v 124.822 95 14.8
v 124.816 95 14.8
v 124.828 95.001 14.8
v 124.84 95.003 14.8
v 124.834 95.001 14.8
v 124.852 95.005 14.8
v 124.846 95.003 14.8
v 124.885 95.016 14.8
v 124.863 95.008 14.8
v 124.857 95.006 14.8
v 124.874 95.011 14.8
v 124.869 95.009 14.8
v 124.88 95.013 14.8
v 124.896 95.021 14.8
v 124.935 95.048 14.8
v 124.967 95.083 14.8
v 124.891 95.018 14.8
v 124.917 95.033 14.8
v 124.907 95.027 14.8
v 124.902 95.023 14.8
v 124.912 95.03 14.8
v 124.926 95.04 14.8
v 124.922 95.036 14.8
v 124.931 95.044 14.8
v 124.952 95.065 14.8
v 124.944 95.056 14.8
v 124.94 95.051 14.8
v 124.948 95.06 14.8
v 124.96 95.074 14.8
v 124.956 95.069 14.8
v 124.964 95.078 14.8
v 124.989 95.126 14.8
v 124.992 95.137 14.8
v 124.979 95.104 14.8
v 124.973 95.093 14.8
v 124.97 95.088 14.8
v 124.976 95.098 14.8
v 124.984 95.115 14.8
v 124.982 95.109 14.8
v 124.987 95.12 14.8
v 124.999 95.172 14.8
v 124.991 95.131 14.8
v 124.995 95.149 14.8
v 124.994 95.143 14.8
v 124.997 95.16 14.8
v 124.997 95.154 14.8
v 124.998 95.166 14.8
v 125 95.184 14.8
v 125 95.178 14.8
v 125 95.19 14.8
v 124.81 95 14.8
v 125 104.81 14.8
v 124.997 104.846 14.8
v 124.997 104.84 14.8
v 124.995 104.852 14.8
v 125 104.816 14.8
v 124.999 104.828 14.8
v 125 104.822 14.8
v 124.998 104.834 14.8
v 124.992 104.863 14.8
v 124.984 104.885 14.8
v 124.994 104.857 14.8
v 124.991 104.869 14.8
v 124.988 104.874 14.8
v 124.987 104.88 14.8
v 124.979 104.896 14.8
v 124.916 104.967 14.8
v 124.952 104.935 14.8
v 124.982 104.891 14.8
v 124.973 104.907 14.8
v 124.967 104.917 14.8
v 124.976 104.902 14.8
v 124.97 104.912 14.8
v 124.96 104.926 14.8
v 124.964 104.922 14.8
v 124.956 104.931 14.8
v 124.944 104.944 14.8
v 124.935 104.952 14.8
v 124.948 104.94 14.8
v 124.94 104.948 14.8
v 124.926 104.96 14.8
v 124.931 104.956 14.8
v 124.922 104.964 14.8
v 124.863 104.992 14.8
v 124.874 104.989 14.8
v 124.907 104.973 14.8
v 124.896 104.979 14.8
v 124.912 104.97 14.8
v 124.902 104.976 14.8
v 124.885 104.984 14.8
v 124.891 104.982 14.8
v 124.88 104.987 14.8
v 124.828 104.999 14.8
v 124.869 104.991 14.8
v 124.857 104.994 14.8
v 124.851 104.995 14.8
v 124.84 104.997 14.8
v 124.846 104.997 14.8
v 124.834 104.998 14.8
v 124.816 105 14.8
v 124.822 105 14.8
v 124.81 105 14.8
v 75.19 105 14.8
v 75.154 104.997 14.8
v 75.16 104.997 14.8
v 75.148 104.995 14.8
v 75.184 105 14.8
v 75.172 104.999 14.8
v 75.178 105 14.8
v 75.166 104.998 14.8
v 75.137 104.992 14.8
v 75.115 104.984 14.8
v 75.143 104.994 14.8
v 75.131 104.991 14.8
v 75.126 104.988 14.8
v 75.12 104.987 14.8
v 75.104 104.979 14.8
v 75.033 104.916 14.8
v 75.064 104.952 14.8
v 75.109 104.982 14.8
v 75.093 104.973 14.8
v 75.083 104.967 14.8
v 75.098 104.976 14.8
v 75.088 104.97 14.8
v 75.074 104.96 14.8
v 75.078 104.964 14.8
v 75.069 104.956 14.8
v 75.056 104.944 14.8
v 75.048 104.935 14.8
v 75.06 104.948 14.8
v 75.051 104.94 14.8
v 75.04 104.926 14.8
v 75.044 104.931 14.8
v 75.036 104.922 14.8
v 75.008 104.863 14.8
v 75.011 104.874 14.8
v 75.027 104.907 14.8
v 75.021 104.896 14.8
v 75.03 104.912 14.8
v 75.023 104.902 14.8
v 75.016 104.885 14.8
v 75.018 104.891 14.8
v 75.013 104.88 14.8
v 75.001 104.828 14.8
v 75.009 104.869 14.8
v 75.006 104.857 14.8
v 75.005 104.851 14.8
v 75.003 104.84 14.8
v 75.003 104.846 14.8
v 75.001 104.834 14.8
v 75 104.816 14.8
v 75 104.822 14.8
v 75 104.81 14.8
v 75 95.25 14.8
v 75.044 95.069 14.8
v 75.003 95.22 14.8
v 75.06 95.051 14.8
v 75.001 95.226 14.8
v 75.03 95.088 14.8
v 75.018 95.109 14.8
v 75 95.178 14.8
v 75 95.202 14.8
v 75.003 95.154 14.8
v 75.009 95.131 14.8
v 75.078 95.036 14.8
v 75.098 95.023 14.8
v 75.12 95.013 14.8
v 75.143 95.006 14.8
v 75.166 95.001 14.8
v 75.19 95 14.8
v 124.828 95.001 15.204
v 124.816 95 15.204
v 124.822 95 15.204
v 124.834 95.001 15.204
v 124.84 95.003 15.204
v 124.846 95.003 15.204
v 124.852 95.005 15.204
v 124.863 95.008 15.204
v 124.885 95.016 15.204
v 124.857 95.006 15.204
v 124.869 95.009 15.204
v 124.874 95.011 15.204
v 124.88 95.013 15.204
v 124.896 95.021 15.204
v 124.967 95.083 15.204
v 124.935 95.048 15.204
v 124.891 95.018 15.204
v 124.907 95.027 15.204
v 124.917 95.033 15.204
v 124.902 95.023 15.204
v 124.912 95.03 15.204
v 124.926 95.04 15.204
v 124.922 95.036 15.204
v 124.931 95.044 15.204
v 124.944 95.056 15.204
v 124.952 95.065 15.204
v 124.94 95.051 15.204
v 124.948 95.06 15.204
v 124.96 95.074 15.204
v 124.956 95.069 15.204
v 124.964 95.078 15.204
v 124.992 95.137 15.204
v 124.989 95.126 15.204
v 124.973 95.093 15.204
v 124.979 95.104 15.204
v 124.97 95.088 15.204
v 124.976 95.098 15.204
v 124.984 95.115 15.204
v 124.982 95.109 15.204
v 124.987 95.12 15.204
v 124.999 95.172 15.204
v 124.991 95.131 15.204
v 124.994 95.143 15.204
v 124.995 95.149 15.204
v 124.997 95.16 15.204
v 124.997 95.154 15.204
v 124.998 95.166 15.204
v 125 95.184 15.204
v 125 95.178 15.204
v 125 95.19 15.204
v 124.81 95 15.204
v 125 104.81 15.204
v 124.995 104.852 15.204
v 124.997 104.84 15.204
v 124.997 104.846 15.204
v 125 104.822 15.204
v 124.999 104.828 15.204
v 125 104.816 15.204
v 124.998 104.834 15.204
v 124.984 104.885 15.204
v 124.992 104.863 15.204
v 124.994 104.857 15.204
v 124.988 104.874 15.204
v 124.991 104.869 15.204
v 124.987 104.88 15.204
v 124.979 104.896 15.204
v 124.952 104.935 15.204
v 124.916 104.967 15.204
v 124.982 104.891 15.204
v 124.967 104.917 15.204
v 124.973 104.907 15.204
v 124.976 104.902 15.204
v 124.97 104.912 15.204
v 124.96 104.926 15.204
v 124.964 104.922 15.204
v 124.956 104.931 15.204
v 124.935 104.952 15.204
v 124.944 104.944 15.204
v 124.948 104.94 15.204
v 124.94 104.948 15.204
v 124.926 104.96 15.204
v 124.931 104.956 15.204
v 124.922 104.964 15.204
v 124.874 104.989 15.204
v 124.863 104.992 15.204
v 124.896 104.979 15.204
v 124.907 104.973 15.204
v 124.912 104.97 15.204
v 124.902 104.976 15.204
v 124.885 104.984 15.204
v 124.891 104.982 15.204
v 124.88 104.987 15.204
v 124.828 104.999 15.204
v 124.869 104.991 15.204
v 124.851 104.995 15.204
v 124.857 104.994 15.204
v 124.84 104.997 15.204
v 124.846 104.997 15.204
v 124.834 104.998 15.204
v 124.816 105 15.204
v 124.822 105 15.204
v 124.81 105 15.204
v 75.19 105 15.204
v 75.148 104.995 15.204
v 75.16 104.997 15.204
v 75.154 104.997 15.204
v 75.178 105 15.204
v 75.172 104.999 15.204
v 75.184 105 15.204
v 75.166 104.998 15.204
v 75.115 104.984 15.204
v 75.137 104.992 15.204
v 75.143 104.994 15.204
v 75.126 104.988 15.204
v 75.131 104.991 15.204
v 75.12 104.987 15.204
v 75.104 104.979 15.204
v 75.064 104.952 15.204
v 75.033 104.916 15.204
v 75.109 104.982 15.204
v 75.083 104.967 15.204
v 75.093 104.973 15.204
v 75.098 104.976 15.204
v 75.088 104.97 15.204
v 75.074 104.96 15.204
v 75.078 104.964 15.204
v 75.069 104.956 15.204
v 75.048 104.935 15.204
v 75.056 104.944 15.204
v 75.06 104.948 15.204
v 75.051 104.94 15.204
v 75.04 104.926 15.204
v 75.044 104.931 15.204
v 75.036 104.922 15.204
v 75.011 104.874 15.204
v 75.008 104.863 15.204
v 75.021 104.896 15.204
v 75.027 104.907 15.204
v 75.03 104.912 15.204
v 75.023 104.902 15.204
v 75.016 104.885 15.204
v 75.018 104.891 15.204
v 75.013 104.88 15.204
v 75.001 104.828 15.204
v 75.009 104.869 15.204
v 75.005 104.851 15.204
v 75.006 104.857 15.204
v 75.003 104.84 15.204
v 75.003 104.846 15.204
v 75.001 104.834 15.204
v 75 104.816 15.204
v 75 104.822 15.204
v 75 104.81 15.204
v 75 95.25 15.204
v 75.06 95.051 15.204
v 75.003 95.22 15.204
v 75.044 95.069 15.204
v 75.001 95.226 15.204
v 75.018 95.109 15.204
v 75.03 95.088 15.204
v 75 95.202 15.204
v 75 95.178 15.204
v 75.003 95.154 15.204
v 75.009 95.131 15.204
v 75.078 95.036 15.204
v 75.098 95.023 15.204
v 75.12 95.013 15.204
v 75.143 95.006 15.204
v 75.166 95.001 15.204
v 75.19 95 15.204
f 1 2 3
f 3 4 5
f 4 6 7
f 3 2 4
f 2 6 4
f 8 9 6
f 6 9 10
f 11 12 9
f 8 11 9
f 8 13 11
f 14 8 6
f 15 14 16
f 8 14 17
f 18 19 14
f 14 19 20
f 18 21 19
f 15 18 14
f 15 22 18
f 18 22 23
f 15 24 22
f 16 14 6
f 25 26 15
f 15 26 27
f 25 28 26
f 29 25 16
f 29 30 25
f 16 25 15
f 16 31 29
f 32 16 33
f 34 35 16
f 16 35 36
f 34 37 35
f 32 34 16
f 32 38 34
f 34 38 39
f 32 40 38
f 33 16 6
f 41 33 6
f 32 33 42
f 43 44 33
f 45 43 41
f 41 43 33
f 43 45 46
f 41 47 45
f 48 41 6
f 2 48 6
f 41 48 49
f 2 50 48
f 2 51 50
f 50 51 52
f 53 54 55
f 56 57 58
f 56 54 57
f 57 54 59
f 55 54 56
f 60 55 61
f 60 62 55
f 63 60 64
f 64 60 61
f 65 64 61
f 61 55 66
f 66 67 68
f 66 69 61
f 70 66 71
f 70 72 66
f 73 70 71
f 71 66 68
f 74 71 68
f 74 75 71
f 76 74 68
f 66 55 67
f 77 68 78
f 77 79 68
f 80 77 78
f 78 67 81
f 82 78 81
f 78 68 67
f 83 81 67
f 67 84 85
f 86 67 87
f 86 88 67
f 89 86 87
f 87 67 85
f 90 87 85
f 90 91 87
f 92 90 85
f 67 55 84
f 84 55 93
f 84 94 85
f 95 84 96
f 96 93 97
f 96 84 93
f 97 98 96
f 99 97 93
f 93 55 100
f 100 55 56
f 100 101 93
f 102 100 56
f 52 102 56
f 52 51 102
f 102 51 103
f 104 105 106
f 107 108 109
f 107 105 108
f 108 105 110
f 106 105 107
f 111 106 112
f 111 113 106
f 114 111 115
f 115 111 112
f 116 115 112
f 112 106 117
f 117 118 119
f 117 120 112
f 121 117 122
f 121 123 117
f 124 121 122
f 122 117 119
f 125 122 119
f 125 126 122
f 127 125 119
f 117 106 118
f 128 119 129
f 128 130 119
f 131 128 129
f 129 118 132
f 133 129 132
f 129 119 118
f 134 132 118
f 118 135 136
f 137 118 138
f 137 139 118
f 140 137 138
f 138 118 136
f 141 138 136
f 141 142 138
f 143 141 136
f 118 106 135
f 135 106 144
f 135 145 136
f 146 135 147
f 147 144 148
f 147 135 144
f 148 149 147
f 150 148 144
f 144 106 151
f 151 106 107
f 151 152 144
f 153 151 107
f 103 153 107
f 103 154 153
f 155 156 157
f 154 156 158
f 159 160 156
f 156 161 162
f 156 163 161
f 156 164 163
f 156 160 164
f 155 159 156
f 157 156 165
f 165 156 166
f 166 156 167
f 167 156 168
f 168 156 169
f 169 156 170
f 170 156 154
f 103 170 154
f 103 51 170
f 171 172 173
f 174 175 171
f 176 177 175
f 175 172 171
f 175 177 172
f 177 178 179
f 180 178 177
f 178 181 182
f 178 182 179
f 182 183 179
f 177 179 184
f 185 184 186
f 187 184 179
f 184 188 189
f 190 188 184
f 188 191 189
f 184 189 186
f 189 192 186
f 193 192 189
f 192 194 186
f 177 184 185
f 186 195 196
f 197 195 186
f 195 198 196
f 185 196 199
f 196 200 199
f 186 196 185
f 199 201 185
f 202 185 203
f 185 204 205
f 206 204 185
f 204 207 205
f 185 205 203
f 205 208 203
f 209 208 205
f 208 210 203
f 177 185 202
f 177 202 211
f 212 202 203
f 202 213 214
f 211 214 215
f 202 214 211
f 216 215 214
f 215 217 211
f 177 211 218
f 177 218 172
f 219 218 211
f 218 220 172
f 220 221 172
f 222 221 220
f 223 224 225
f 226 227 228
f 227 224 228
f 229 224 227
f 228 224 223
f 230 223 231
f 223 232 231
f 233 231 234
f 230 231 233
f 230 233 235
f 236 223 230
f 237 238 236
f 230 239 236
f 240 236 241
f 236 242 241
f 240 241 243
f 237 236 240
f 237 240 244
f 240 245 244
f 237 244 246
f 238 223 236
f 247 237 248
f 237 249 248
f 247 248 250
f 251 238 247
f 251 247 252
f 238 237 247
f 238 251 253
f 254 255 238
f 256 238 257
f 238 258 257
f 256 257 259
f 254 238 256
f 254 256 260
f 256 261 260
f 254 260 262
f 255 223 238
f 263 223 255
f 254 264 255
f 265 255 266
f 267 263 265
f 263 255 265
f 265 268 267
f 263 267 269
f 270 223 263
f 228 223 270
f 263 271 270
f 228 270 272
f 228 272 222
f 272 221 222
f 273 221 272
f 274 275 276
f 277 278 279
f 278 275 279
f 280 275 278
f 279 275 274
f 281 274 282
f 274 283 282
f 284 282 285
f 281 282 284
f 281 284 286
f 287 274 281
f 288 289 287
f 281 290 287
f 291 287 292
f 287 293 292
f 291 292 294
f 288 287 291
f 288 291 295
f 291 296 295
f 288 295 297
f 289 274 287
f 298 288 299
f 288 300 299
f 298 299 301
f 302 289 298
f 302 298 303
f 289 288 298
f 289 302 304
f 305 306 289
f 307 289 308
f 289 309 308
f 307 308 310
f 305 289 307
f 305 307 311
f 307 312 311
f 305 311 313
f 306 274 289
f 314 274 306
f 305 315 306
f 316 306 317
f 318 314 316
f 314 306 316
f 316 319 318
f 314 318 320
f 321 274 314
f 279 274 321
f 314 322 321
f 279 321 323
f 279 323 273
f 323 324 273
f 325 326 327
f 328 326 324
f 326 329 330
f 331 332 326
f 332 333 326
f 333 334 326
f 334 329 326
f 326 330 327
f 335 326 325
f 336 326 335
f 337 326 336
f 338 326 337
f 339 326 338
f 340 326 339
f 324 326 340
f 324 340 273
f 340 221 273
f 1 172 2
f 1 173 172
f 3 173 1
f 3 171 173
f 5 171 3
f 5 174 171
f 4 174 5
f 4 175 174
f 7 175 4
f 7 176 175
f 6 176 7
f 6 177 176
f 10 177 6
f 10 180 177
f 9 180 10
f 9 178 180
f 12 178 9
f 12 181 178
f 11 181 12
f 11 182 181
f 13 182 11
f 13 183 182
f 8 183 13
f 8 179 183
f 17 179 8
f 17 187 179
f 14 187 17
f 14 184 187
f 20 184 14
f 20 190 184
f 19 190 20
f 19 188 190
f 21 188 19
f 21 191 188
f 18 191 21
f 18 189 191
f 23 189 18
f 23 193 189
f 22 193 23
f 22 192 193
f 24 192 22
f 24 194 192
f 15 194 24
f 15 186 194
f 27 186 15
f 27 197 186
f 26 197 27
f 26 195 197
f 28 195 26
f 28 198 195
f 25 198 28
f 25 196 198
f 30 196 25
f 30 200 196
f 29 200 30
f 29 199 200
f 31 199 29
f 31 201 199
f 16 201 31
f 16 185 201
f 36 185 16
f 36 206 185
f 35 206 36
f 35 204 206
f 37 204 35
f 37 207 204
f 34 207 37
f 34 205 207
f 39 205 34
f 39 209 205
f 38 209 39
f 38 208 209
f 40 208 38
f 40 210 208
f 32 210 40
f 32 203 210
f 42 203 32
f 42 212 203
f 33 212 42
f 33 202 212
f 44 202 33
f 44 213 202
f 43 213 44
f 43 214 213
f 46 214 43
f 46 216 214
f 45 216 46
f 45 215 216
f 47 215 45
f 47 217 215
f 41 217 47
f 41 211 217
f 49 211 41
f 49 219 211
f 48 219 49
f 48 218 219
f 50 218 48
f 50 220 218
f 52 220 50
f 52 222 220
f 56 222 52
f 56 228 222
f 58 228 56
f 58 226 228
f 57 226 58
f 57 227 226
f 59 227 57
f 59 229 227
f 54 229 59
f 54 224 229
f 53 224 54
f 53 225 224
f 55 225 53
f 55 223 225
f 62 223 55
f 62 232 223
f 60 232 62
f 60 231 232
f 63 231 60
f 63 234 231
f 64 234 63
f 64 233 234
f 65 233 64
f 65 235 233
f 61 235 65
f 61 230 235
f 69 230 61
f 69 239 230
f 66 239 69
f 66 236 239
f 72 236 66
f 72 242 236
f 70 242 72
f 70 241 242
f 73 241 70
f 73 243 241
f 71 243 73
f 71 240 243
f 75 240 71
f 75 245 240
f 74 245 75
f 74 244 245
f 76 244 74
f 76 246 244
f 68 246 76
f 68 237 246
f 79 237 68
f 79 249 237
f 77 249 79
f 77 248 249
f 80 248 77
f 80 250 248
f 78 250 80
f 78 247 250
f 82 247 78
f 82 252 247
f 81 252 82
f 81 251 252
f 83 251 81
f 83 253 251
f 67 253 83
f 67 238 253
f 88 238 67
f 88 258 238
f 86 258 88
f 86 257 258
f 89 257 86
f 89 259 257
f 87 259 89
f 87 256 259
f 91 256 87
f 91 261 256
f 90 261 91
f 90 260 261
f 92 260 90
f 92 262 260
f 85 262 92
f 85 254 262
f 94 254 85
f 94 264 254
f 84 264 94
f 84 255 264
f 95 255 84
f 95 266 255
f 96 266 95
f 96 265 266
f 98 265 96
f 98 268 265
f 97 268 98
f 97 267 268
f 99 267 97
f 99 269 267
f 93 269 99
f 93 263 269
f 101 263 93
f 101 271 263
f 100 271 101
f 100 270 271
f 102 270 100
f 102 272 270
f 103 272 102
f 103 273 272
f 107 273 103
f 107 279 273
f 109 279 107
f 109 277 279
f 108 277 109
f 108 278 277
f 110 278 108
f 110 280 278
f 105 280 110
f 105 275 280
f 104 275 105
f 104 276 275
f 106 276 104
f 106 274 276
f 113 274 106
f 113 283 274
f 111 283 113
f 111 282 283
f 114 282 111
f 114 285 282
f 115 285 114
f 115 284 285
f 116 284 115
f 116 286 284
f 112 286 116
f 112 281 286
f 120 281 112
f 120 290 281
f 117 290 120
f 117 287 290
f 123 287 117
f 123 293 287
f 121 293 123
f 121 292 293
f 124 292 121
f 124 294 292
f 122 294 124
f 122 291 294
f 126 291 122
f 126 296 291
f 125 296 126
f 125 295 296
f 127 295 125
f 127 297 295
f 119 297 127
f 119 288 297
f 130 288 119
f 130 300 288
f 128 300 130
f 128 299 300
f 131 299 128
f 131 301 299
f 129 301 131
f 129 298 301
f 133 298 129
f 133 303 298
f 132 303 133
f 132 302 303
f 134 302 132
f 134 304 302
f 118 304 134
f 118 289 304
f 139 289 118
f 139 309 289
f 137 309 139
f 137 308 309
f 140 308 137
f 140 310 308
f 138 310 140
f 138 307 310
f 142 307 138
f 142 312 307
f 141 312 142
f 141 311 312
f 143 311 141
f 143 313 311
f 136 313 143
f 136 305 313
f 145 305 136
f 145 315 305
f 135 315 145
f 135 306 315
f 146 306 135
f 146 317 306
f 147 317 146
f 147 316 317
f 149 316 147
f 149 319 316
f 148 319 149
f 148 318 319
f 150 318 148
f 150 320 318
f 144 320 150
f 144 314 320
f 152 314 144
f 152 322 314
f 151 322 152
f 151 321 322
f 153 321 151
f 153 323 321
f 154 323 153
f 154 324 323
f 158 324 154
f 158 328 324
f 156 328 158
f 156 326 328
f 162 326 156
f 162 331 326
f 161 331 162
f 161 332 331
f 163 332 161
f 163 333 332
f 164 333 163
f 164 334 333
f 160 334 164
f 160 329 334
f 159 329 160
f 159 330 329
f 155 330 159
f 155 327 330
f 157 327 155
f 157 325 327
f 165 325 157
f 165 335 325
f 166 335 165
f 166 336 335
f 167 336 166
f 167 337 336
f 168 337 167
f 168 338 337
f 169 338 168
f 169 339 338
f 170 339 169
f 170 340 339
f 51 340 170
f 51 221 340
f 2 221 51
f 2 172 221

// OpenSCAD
module drawBasicShape(x1, y1, x2, y2, width)
{
	length = sqrt((x1-x2)*(x1-x2) + (y1-y2)*(y1-y2));
	if (width!=0.0) {
		square(size = [width, length], center = false);
		translate([width/2.0, 0, 0]) circle(d=width);
		translate([width/2.0, length, 0]) circle(d=width);
	}
}

module translateAndRotate(x1, y1, x2, y2, width)
{
	if (width != 0.0) {
		angle = atan((y2-y1)/(x2-x1)) +270;
		if (x2>=x1) {
			translate([x1, y1, 0.0]) rotate([0.0, 0.0, angle]) translate([-width/2.0, 0.0, 0.0]) scale([1.0, 1.0, 1.0]) drawBasicShape(x1, y1, x2, y2, width);
		}
		else {
			translate([x1, y1, 0.0]) rotate([0.0, 0.0, angle+180]) translate([-width/2.0, 0.0, 0.0]) scale([1.0, 1.0, 1.0]) drawBasicShape(x1, y1, x2, y2, width);		}
	}
}

$fn=50;

points36 = [
[75.77800000, 95.77800000, 0.00000000],
[124.22200000, 95.77800000, 0.37999548],
[124.22200000, 104.22200000, 0.37997788],
[75.77800000, 104.22200000, 0.37999672],
[75.77800000, 95.83800000, 0.37997423],
[75.48400000, 95.48400000, 0.00000000],
[124.51600000, 95.48400000, 0.37999868],
[124.51600000, 104.51600000, 0.37998977],
[75.48400000, 104.51600000, 0.37999746],
[75.48400000, 95.54400000, 0.37999314],
[75.19000000, 95.19000000, 0.00000000],
[124.81000000, 95.19000000, 0.37999939],
[124.81000000, 104.81000000, 0.38000021],
[75.19000000, 104.81000000, 0.38000060],
[75.19000000, 95.25000000, 0.37999715],
[75.53600000, 95.39000000, 0.00000000],
[75.94600000, 103.88900000, 0.00000000],
[76.11100000, 104.05400000, 0.38038683],
[76.52800000, 104.05400000, 0.38073291],
[75.94600000, 103.47200000, 0.38070298],
[75.94600000, 103.05500000, 0.38073291],
[76.94500000, 104.05400000, 0.38071263],
[77.36200000, 104.05400000, 0.38073291],
[75.94600000, 102.63800000, 0.38074663],
[75.94600000, 102.22100000, 0.38087711],
[77.77900000, 104.05400000, 0.38074196],
[78.19600000, 104.05400000, 0.38073291],
[75.94600000, 101.80400000, 0.38077681],
[75.94600000, 101.38700000, 0.38073291],
[78.61300000, 104.05400000, 0.38076888],
[79.03000000, 104.05400000, 0.38073291],
[75.94600000, 100.97000000, 0.38077689],
[75.94600000, 100.55300000, 0.38073291],
[79.44700000, 104.05400000, 0.38077084],
[79.86400000, 104.05400000, 0.38087711],
[75.94600000, 100.13600000, 0.38077693],
[75.94600000, 99.71900000, 0.38073291],
[80.28100000, 104.05400000, 0.38078185],
[80.69800000, 104.05400000, 0.38073291],
[75.94600000, 99.30200000, 0.38077696],
[75.94600000, 98.88500000, 0.38087711],
[81.11500000, 104.05400000, 0.38078108],
[81.53300000, 104.05400000, 0.38002742],
[75.94600000, 98.46700000, 0.38073180],
[75.94600000, 98.05000000, 0.38073291],
[81.95000000, 104.05400000, 0.38073848],
[82.36700000, 104.05400000, 0.38073291],
[75.94600000, 97.63300000, 0.38073768],
[75.94600000, 97.21600000, 0.38087711],
[82.78400000, 104.05400000, 0.38073697],
[83.20100000, 104.05400000, 0.38087711],
[75.94600000, 96.79900000, 0.38074221],
[75.94600000, 96.38200000, 0.38087711],
[83.61800000, 104.05400000, 0.38074688],
[84.03500000, 104.05400000, 0.38073291],
[75.95600000, 95.97600000, 0.38075015],
[76.34400000, 95.94600000, 0.38035263],
[84.45200000, 104.05400000, 0.38075745],
[84.86900000, 104.05400000, 0.38073291],
[76.76100000, 95.94600000, 0.38075745],
[77.17800000, 95.94600000, 0.38073291],
[85.28600000, 104.05400000, 0.38075745],
[85.70300000, 104.05400000, 0.38073291],
[77.59500000, 95.94600000, 0.38075745],
[78.01200000, 95.94600000, 0.38073291],
[86.12000000, 104.05400000, 0.38075745],
[86.53700000, 104.05400000, 0.38073291],
[78.42900000, 95.94600000, 0.38075745],
[78.84600000, 95.94600000, 0.38073291],
[86.95400000, 104.05400000, 0.38075745],
[87.37100000, 104.05400000, 0.38073291],
[79.26300000, 95.94600000, 0.38075745],
[79.68000000, 95.94600000, 0.38073291],
[87.78900000, 104.05400000, 0.38073927],
[88.20600000, 104.05400000, 0.38073291],
[80.09700000, 95.94600000, 0.38073927],
[80.51400000, 95.94600000, 0.38073291],
[88.62300000, 104.05400000, 0.38073927],
[89.04000000, 104.05400000, 0.38073291],
[80.93200000, 95.94600000, 0.38075745],
[81.34900000, 95.94600000, 0.38073291],
[89.45700000, 104.05400000, 0.38075745],
[89.87400000, 104.05400000, 0.38073291],
[81.76600000, 95.94600000, 0.38075745],
[82.18300000, 95.94600000, 0.38073291],
[90.29100000, 104.05400000, 0.38075745],
[90.70800000, 104.05400000, 0.38073291],
[82.60000000, 95.94600000, 0.38075745],
[83.01700000, 95.94600000, 0.38073291],
[91.12500000, 104.05400000, 0.38075745],
[91.54200000, 104.05400000, 0.38073291],
[83.43400000, 95.94600000, 0.38075745],
[83.85100000, 95.94600000, 0.38073291],
[91.95900000, 104.05400000, 0.38075745],
[92.37600000, 104.05400000, 0.38073291],
[84.26800000, 95.94600000, 0.38075745],
[84.68500000, 95.94600000, 0.38073291],
[92.79300000, 104.05400000, 0.38075745],
[93.21000000, 104.05400000, 0.38087711],
[85.10200000, 95.94600000, 0.38075221],
[85.51900000, 95.94600000, 0.38087711],
[93.62700000, 104.05400000, 0.38075221],
[94.04400000, 104.05400000, 0.38087711],
[85.93600000, 95.94600000, 0.38075221],
[86.35300000, 95.94600000, 0.38087711],
[94.46200000, 104.05400000, 0.38073402],
[94.87900000, 104.05400000, 0.38087711],
[86.77000000, 95.94600000, 0.38073402],
[87.18800000, 95.94600000, 0.38017128],
[95.29600000, 104.05400000, 0.38075221],
[95.71300000, 104.05400000, 0.38087711],
[87.60500000, 95.94600000, 0.38075221],
[88.02200000, 95.94600000, 0.38087711],
[96.13000000, 104.05400000, 0.38075221],
[96.54700000, 104.05400000, 0.38087711],
[88.43900000, 95.94600000, 0.38075221],
[88.85600000, 95.94600000, 0.38087711],
[96.96400000, 104.05400000, 0.38075221],
[97.38100000, 104.05400000, 0.38087711],
[89.27300000, 95.94600000, 0.38075221],
[89.69000000, 95.94600000, 0.38087711],
[97.79800000, 104.05400000, 0.38075221],
[98.21500000, 104.05400000, 0.38087711],
[90.10700000, 95.94600000, 0.38075221],
[90.52400000, 95.94600000, 0.38087711],
[98.63200000, 104.05400000, 0.38075221],
[99.04900000, 104.05400000, 0.38087711],
[90.94100000, 95.94600000, 0.38075221],
[91.35800000, 95.94600000, 0.38087711],
[99.46600000, 104.05400000, 0.38075221],
[99.88300000, 104.05400000, 0.38087711],
[91.77500000, 95.94600000, 0.38075221],
[92.19200000, 95.94600000, 0.38087711],
[100.30000000, 104.05400000, 0.38075221],
[100.71800000, 104.05400000, 0.38017128],
[92.60900000, 95.94600000, 0.38073402],
[93.02600000, 95.94600000, 0.38087711],
[101.13500000, 104.05400000, 0.38073402],
[101.55200000, 104.05400000, 0.38087711],
[93.44400000, 95.94600000, 0.38075221],
[93.86100000, 95.94600000, 0.38087711],
[101.96900000, 104.05400000, 0.38075221],
[102.38600000, 104.05400000, 0.38087711],
[94.27800000, 95.94600000, 0.38075221],
[94.69500000, 95.94600000, 0.38087711],
[102.80300000, 104.05400000, 0.38075221],
[103.22000000, 104.05400000, 0.38087711],
[95.11200000, 95.94600000, 0.38075221],
[95.52900000, 95.94600000, 0.38087711],
[103.63700000, 104.05400000, 0.38075221],
[104.05400000, 104.05400000, 0.38087711],
[95.94600000, 95.94600000, 0.38075221],
[96.36300000, 95.94600000, 0.38087711],
[104.47100000, 104.05400000, 0.38075221],
[104.88800000, 104.05400000, 0.38087711],
[96.78000000, 95.94600000, 0.38075221],
[97.19700000, 95.94600000, 0.38087711],
[105.30500000, 104.05400000, 0.38075221],
[105.72200000, 104.05400000, 0.38087711],
[97.61400000, 95.94600000, 0.38075221],
[98.03100000, 95.94600000, 0.38087711],
[106.13900000, 104.05400000, 0.38075221],
[106.55600000, 104.05400000, 0.38087711],
[98.44800000, 95.94600000, 0.38075221],
[98.86500000, 95.94600000, 0.38087711],
[106.97300000, 104.05400000, 0.38075221],
[107.39100000, 104.05400000, 0.38017128],
[99.28200000, 95.94600000, 0.38073402],
[99.69900000, 95.94600000, 0.38087711],
[107.80800000, 104.05400000, 0.38073402],
[108.22500000, 104.05400000, 0.38087711],
[100.11700000, 95.94600000, 0.38075221],
[100.53400000, 95.94600000, 0.38087711],
[108.64200000, 104.05400000, 0.38075221],
[109.05900000, 104.05400000, 0.38087711],
[100.95100000, 95.94600000, 0.38075221],
[101.36800000, 95.94600000, 0.38087711],
[109.47600000, 104.05400000, 0.38075221],
[109.89300000, 104.05400000, 0.38087711],
[101.78500000, 95.94600000, 0.38075221],
[102.20200000, 95.94600000, 0.38087711],
[110.31000000, 104.05400000, 0.38075221],
[110.72700000, 104.05400000, 0.38087711],
[102.61900000, 95.94600000, 0.38075221],
[103.03600000, 95.94600000, 0.38087711],
[111.14400000, 104.05400000, 0.38075221],
[111.56100000, 104.05400000, 0.38087711],
[103.45300000, 95.94600000, 0.38075221],
[103.87000000, 95.94600000, 0.38087711],
[111.97800000, 104.05400000, 0.38075221],
[112.39500000, 104.05400000, 0.38087711],
[104.28700000, 95.94600000, 0.38075221],
[104.70400000, 95.94600000, 0.38087711],
[112.81200000, 104.05400000, 0.38075221],
[113.22900000, 104.05400000, 0.38087711],
[105.12100000, 95.94600000, 0.38075221],
[105.53800000, 95.94600000, 0.38087711],
[113.64700000, 104.05400000, 0.38073402],
[114.06400000, 104.05400000, 0.38087711],
[105.95500000, 95.94600000, 0.38073402],
[106.37300000, 95.94600000, 0.38017128],
[114.48100000, 104.05400000, 0.38075221],
[114.89800000, 104.05400000, 0.38087711],
[106.79000000, 95.94600000, 0.38075745],
[107.20700000, 95.94600000, 0.38073291],
[115.31500000, 104.05400000, 0.38075745],
[115.73200000, 104.05400000, 0.38073291],
[107.62400000, 95.94600000, 0.38075745],
[108.04100000, 95.94600000, 0.38073291],
[116.14900000, 104.05400000, 0.38075745],
[116.56600000, 104.05400000, 0.38073291],
[108.45800000, 95.94600000, 0.38075745],
[108.87500000, 95.94600000, 0.38073291],
[116.98300000, 104.05400000, 0.38075745],
[117.40000000, 104.05400000, 0.38073291],
[109.29200000, 95.94600000, 0.38075745],
[109.70900000, 95.94600000, 0.38073291],
[117.81700000, 104.05400000, 0.38075745],
[118.23400000, 104.05400000, 0.38073291],
[110.12600000, 95.94600000, 0.38075745],
[110.54300000, 95.94600000, 0.38073291],
[118.65100000, 104.05400000, 0.38075745],
[119.06800000, 104.05400000, 0.38073291],
[110.96000000, 95.94600000, 0.38075745],
[111.37700000, 95.94600000, 0.38073291],
[119.48500000, 104.05400000, 0.38075745],
[119.90300000, 104.05400000, 0.38002742],
[111.79400000, 95.94600000, 0.38073927],
[112.21100000, 95.94600000, 0.38073291],
[120.32000000, 104.05400000, 0.38073927],
[120.73700000, 104.05400000, 0.38073291],
[112.62900000, 95.94600000, 0.38075745],
[113.04600000, 95.94600000, 0.38073291],
[121.15400000, 104.05400000, 0.38075745],
[121.57100000, 104.05400000, 0.38073291],
[113.46300000, 95.94600000, 0.38075745],
[113.88000000, 95.94600000, 0.38073291],
[121.98800000, 104.05400000, 0.38075745],
[122.40500000, 104.05400000, 0.38073291],
[114.29700000, 95.94600000, 0.38075745],
[114.71400000, 95.94600000, 0.38073291],
[122.82200000, 104.05400000, 0.38075745],
[123.23900000, 104.05400000, 0.38073291],
[115.13100000, 95.94600000, 0.38075745],
[115.54800000, 95.94600000, 0.38073291],
[123.65600000, 104.05400000, 0.38075745],
[124.04400000, 104.02500000, 0.38041002],
[115.96500000, 95.94600000, 0.38073190],
[116.38200000, 95.94600000, 0.38087711],
[124.05400000, 103.61800000, 0.38074688],
[124.05400000, 103.20100000, 0.38087711],
[116.79900000, 95.94600000, 0.38074221],
[117.21600000, 95.94600000, 0.38087711],
[124.05400000, 102.78400000, 0.38074319],
[124.05400000, 102.36700000, 0.38073291],
[117.63300000, 95.94600000, 0.38074430],
[118.05000000, 95.94600000, 0.38073291],
[124.05400000, 101.95000000, 0.38073848],
[124.05400000, 101.53300000, 0.38073291],
[118.46700000, 95.94600000, 0.38073180],
[118.88400000, 95.94600000, 0.38087711],
[124.05400000, 101.11600000, 0.38072403],
[124.05400000, 100.69800000, 0.38002742],
[119.30200000, 95.94600000, 0.38078590],
[119.71900000, 95.94600000, 0.38073291],
[124.05400000, 100.28100000, 0.38078185],
[124.05400000, 99.86400000, 0.38087711],
[120.13600000, 95.94600000, 0.38077693],
[120.55300000, 95.94600000, 0.38073291],
[124.05400000, 99.44700000, 0.38078298],
[124.05400000, 99.03000000, 0.38073291],
[120.97000000, 95.94600000, 0.38077689],
[121.38700000, 95.94600000, 0.38087711],
[124.05400000, 98.61300000, 0.38076888],
[124.05400000, 98.19600000, 0.38073291],
[121.80400000, 95.94600000, 0.38077681],
[122.22100000, 95.94600000, 0.38073291],
[124.05400000, 97.77900000, 0.38076515],
[124.05400000, 97.36200000, 0.38073291],
[122.63800000, 95.94600000, 0.38077665],
[123.05500000, 95.94600000, 0.38073291],
[124.05400000, 96.94500000, 0.38071263],
[124.05400000, 96.52800000, 0.38087711],
[123.47200000, 95.94600000, 0.38070298],
[123.88900000, 95.94600000, 0.38073291],
[124.05400000, 96.11100000, 0.38038683],
];

translate([0.0, 0.0, 14.80000000]) {
	linear_extrude(height = 0.40400000, center = false, convexity = 10, twist = 0) {
		union() {
			for( i=[0:len(points36)-2] ){ 
				x1 = points36[i][0];
				y1 = points36[i][1];
				x2 = points36[i+1][0];
				y2 = points36[i+1][1];
				width = points36[i+1][2];
				translateAndRotate(x1, y1, x2, y2, width);
			}
		}
	}
}
